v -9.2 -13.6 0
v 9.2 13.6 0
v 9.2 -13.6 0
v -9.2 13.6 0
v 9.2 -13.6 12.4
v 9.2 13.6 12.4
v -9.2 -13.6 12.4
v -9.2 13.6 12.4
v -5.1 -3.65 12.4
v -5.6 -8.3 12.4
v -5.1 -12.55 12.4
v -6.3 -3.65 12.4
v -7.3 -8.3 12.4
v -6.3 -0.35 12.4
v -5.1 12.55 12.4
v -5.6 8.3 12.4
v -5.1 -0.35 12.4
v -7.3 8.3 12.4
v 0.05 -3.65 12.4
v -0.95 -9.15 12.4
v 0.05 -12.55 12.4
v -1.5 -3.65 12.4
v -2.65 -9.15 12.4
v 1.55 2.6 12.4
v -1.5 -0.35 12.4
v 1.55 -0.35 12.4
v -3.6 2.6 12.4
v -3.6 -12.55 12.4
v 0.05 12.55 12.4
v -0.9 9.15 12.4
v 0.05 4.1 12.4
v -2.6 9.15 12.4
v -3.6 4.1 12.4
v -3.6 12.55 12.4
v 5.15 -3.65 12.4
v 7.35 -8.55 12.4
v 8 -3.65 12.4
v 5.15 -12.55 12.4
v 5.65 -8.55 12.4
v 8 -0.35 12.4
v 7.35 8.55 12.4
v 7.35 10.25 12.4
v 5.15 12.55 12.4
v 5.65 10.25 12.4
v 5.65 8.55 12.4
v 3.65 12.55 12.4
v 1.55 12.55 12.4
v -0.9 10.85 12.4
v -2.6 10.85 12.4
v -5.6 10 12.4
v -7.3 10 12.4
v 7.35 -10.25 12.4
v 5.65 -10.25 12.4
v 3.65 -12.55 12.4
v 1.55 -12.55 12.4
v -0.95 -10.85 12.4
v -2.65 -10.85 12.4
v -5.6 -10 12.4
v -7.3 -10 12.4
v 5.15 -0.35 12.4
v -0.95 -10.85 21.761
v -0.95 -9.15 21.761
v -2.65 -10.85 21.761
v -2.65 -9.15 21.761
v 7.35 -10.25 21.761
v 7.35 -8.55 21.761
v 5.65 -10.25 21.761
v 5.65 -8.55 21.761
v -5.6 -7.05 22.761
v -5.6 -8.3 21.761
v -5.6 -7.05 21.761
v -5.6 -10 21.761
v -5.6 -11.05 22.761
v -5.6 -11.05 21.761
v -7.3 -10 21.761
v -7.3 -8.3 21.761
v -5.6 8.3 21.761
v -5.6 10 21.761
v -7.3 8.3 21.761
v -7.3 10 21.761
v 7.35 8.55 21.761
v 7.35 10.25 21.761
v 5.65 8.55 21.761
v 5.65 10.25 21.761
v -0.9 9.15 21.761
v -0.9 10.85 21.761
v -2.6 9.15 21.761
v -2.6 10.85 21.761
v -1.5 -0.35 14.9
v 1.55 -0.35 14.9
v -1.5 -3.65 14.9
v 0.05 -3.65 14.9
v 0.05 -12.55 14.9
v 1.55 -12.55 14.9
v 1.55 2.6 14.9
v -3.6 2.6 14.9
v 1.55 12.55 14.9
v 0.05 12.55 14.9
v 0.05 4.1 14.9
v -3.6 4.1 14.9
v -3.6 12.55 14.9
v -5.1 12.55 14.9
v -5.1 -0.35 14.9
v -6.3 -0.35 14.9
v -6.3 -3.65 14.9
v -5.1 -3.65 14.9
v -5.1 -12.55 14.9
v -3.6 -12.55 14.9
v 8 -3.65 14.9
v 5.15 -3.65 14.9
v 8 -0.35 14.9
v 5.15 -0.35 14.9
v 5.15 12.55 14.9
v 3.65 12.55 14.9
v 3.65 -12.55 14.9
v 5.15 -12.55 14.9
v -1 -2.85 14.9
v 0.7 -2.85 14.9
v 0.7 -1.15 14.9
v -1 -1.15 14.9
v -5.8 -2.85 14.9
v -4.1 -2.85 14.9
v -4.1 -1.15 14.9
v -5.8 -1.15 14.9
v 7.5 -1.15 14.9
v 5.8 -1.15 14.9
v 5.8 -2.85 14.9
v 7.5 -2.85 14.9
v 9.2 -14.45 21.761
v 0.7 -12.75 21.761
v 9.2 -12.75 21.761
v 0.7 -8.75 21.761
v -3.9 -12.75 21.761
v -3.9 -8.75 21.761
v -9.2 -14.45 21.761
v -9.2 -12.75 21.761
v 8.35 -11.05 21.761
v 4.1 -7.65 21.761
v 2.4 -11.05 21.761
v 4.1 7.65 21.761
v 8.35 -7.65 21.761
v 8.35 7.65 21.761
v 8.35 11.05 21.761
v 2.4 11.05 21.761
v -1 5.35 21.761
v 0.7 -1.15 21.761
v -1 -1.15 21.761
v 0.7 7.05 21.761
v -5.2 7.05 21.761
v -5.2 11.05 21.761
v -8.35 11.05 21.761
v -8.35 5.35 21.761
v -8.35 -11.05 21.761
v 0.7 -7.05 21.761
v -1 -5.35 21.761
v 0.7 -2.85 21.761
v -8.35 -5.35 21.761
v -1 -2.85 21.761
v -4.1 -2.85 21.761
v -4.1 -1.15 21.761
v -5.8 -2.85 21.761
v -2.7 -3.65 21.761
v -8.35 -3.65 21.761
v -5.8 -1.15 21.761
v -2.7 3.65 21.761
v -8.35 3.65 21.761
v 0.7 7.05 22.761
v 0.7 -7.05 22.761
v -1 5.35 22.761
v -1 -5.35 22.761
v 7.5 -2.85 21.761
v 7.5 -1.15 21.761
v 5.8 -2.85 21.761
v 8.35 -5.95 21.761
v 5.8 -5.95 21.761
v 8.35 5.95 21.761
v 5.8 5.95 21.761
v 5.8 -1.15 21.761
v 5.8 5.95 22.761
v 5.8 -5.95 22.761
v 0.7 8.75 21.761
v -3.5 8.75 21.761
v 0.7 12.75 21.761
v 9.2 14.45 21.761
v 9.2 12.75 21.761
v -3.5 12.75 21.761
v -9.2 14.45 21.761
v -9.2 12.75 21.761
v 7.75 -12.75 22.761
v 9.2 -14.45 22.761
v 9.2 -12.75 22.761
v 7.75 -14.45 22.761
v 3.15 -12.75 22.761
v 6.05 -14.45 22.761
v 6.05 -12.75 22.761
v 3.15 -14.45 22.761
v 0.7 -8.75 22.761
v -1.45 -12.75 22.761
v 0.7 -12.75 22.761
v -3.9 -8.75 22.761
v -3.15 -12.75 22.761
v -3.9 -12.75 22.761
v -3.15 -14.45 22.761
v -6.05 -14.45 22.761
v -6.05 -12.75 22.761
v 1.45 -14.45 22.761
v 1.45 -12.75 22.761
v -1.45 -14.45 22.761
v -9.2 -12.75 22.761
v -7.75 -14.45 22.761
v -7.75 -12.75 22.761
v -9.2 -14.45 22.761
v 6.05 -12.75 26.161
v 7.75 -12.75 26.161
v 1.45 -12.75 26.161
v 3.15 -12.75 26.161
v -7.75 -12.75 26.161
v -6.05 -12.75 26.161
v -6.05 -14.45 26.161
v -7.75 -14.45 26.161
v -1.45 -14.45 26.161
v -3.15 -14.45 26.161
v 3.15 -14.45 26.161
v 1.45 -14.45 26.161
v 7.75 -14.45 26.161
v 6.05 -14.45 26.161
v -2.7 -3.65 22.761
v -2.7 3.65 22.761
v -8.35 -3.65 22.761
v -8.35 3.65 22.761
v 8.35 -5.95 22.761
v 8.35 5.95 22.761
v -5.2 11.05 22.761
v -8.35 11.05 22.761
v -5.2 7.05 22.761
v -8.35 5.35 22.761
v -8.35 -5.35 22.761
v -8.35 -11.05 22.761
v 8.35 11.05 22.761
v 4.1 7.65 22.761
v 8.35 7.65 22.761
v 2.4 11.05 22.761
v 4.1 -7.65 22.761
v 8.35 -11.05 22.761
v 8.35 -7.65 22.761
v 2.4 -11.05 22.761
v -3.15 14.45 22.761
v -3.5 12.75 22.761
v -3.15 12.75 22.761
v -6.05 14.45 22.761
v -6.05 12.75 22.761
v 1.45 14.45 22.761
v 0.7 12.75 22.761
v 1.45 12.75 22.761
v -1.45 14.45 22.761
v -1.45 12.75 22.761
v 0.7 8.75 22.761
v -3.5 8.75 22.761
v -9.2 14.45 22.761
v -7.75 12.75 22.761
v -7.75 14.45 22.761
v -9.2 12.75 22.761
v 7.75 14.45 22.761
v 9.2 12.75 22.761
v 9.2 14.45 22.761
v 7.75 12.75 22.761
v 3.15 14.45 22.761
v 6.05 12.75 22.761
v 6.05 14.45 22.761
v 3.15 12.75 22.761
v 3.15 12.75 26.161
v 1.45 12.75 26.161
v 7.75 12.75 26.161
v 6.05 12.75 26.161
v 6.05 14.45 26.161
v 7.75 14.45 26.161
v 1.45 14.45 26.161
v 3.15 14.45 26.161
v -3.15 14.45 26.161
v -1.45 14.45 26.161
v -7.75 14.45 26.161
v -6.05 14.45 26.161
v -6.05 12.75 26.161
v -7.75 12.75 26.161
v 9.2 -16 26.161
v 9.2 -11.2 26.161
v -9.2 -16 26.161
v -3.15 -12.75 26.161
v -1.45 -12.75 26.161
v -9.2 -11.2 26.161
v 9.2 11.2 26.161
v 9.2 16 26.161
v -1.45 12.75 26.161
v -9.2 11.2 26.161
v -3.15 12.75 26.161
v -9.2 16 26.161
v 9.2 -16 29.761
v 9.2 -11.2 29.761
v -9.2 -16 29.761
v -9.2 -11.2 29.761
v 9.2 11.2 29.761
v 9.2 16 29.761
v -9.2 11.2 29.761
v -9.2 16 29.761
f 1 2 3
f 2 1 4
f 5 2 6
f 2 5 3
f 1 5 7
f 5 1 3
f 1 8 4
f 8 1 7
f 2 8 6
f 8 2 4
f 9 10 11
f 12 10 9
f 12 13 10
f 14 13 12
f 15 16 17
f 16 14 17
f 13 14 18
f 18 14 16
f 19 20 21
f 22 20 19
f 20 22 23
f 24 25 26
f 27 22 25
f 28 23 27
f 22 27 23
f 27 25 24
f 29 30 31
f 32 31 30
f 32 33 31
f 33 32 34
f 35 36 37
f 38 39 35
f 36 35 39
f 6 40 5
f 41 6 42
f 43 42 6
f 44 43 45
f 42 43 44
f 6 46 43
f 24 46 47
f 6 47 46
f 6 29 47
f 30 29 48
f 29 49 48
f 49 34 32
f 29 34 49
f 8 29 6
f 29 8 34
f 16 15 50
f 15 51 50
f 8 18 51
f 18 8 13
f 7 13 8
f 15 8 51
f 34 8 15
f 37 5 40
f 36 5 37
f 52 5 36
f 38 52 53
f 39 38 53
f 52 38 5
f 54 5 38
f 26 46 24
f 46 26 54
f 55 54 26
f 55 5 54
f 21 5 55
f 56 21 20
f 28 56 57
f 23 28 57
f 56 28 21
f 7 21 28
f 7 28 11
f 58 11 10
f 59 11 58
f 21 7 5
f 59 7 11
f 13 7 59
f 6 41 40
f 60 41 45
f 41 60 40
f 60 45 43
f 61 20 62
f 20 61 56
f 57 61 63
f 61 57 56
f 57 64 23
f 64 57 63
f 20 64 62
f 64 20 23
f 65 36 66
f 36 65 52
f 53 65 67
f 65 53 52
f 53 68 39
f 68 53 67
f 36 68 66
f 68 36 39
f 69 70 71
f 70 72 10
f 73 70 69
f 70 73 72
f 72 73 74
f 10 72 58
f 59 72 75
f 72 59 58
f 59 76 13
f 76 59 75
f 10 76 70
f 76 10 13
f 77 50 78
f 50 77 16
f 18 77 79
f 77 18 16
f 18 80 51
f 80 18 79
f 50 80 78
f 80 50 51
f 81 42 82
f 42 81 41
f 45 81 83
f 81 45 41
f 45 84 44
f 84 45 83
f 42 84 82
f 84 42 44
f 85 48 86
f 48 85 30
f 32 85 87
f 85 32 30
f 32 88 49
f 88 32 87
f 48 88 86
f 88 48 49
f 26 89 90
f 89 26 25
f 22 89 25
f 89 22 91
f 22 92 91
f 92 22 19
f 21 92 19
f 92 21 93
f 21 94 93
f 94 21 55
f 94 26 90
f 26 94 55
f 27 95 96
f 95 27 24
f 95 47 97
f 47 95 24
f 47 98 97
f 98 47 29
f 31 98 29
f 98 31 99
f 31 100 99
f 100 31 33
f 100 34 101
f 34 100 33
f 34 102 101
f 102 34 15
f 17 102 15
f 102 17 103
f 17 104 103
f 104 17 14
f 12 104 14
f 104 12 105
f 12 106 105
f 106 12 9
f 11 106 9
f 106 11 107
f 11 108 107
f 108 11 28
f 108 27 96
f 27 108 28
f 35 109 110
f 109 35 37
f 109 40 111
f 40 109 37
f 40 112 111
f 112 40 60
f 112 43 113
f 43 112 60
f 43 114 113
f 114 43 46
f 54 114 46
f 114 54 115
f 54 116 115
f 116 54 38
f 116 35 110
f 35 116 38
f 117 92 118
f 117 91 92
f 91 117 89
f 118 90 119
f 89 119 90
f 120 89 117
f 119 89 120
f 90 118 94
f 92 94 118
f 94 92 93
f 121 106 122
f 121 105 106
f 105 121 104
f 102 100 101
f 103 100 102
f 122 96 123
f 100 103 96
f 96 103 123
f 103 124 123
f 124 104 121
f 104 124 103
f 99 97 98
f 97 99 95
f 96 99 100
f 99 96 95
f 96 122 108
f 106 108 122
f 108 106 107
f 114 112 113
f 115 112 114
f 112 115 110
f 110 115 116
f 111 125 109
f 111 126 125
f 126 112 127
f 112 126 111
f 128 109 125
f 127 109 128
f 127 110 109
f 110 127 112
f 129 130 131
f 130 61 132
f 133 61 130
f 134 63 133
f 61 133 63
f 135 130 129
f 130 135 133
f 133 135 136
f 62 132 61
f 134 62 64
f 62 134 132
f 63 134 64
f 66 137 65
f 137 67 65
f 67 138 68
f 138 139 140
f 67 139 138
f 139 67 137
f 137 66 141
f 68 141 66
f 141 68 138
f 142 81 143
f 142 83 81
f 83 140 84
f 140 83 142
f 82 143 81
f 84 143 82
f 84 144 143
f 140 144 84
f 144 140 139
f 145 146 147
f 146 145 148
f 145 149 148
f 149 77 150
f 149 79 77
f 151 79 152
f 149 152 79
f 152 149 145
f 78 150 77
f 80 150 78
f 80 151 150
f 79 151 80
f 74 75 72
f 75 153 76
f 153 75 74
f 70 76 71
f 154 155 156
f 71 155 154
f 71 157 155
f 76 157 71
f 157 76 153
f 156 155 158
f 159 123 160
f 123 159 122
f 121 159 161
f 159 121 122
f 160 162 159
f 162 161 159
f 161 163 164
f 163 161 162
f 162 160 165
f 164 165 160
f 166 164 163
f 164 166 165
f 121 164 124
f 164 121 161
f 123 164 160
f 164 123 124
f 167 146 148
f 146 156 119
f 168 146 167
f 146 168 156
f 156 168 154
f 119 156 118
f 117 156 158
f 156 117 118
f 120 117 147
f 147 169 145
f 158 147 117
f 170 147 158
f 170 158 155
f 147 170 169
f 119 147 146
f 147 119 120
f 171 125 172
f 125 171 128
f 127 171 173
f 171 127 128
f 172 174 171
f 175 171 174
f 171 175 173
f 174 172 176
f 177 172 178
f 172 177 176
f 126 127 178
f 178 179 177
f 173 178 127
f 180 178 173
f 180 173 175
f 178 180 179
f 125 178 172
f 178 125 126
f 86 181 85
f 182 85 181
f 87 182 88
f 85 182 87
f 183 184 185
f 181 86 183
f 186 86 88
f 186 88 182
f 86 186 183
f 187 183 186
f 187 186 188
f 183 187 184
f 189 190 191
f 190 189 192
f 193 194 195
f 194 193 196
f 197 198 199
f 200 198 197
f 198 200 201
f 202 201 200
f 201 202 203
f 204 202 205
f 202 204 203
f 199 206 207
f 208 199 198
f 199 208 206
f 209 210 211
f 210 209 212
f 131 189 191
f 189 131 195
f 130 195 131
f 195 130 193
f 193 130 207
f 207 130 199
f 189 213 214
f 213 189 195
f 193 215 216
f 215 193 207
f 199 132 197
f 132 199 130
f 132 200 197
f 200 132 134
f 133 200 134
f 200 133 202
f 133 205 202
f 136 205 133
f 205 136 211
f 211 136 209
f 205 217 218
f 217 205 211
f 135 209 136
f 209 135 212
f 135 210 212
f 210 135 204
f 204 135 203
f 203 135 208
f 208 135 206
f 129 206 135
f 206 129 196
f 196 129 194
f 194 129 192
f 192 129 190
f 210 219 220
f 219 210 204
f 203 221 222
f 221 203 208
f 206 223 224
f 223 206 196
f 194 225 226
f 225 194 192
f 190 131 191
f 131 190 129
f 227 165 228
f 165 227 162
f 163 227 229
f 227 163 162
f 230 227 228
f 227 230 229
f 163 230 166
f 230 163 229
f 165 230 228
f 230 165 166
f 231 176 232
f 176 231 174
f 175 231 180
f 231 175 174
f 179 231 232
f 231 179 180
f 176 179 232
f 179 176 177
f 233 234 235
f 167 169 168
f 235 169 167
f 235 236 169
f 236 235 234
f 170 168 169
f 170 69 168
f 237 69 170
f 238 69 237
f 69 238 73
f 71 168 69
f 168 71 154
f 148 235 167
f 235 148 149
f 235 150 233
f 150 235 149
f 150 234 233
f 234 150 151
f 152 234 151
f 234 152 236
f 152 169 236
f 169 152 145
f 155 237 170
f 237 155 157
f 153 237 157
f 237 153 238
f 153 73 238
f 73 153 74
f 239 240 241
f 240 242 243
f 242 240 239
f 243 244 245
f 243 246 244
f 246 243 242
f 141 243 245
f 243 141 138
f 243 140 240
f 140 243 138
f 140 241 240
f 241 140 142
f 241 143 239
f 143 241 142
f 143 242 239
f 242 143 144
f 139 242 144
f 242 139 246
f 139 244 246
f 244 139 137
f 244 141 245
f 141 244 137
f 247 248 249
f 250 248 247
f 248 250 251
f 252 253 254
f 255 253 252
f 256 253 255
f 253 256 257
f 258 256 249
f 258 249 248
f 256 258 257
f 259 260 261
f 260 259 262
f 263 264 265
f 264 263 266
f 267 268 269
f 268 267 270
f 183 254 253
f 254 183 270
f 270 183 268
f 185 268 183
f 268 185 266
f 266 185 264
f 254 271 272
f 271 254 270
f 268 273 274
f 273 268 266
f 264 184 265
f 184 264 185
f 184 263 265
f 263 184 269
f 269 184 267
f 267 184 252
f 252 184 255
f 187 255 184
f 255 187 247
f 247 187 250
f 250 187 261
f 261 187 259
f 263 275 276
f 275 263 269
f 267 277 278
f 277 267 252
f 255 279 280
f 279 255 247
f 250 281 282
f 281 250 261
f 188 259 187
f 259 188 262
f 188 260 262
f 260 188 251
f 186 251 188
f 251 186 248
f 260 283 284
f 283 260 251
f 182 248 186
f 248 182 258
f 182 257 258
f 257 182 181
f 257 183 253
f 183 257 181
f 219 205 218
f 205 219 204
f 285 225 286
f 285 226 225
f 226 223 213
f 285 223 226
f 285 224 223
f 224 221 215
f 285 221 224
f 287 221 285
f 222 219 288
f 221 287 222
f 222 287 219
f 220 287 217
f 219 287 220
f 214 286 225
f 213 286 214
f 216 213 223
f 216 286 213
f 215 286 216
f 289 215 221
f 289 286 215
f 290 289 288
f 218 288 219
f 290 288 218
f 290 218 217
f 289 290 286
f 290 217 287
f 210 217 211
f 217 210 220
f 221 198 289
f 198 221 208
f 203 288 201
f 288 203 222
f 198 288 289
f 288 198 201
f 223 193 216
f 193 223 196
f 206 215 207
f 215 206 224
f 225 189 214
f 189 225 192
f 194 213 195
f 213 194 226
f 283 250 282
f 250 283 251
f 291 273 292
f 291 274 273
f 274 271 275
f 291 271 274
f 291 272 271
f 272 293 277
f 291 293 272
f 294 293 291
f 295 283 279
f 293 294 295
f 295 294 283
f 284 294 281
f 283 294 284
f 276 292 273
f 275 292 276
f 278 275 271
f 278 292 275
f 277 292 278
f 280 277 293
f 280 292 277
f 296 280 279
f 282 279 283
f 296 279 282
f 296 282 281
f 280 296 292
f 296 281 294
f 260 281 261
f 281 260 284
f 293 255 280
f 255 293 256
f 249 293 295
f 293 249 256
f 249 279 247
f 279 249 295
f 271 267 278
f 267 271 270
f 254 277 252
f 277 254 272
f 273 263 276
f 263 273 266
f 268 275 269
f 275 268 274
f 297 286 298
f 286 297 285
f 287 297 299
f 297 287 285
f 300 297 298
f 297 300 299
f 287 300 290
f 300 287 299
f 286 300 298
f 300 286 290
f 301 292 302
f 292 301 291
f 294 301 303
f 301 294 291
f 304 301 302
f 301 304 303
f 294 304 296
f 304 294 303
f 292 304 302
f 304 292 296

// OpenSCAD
// Generated by SolidPython 0.4.2 on 2020-09-29 23:20:48
//!OpenSCAD

scale(v = 0.0100000000) {
	translate(v = [-920, -1360, 0]) {
		union() {
			color(c = [0.4000000000, 0.4000000000, 0.4000000000]) {
				translate(v = [0, 0, 0]) {
					linear_extrude(height = 1000.0000000000) {
						polygon(paths = [[0, 1, 2, 3]], points = [[0, 0], [0, 2720], [1840, 2720], [1840, 0]]);
					}
				}
			}
			color(c = [0.2000000000, 0.6000000000, 0.2000000000]) {
				translate(v = [0, 0, 1000.0000000000]) {
					linear_extrude(height = 120.0000000000) {
						polygon(paths = [[0, 1, 2, 3]], points = [[0, 1305], [0, 2720], [1840, 2720], [1840, 1305]]);
					}
				}
			}
			color(c = [0.4000000000, 0.4000000000, 0.4000000000]) {
				translate(v = [0, 0, 1000.0000000000]) {
					linear_extrude(height = 120.0000000000) {
						polygon(paths = [[0, 1, 2, 3]], points = [[0, 0], [0, 1305], [1840, 1305], [1840, 0]]);
					}
				}
			}
			color(c = [0.9000000000, 0.6000000000, 0.6000000000]) {
				translate(v = [0, 0, 1120.0000000000]) {
					linear_extrude(height = 120.0000000000) {
						polygon(paths = [[0, 1, 2, 3]], points = [[150, 2065], [150, 2485], [410, 2485], [410, 2065]]);
					}
				}
			}
			color(c = [0.9000000000, 0.6000000000, 0.6000000000]) {
				translate(v = [0, 0, 1120.0000000000]) {
					linear_extrude(height = 120.0000000000) {
						polygon(paths = [[0, 1, 2, 3, 4, 5]], points = [[635, 1845], [635, 2065], [560, 2065], [560, 2485], [925, 2485], [925, 1845]]);
					}
				}
			}
			color(c = [0.9000000000, 0.6000000000, 0.6000000000]) {
				translate(v = [0, 0, 1120.0000000000]) {
					linear_extrude(height = 120.0000000000) {
						polygon(paths = [[0, 1, 2, 3]], points = [[1075, 1845], [1075, 2485], [1285, 2485], [1285, 1845]]);
					}
				}
			}
			color(c = [0.9000000000, 0.6000000000, 0.6000000000]) {
				translate(v = [0, 0, 1120.0000000000]) {
					linear_extrude(height = 120.0000000000) {
						polygon(paths = [[0, 1, 2, 3]], points = [[1435, 1845], [1435, 2485], [1695, 2485], [1695, 1845]]);
					}
				}
			}
			color(c = [0.9000000000, 0.6000000000, 0.9000000000]) {
				translate(v = [0, 0, 1120.0000000000]) {
					linear_extrude(height = 120.0000000000) {
						polygon(paths = [[0, 1, 2, 3]], points = [[150, 235], [150, 655], [410, 655], [410, 235]]);
					}
				}
			}
			color(c = [0.9000000000, 0.6000000000, 0.9000000000]) {
				translate(v = [0, 0, 1120.0000000000]) {
					linear_extrude(height = 120.0000000000) {
						polygon(paths = [[0, 1, 2, 3]], points = [[560, 235], [560, 655], [925, 655], [925, 235]]);
					}
				}
			}
			color(c = [0.9000000000, 0.6000000000, 0.9000000000]) {
				translate(v = [0, 0, 1120.0000000000]) {
					linear_extrude(height = 120.0000000000) {
						polygon(paths = [[0, 1, 2, 3]], points = [[1075, 235], [1075, 655], [1285, 655], [1285, 235]]);
					}
				}
			}
			color(c = [0.9000000000, 0.6000000000, 0.9000000000]) {
				translate(v = [0, 0, 1120.0000000000]) {
					linear_extrude(height = 120.0000000000) {
						polygon(paths = [[0, 1, 2, 3]], points = [[1435, 235], [1435, 655], [1695, 655], [1695, 235]]);
					}
				}
			}
			color(c = [0.2000000000, 0.6000000000, 0.2000000000]) {
				translate(v = [0, 0, 1120.0000000000]) {
					linear_extrude(height = 120.0000000000) {
						difference() {
							polygon(paths = [[0, 1, 2, 3]], points = [[0, 1305], [0, 2720], [1840, 2720], [1840, 1305]]);
							polygon(paths = [[0, 1, 2, 3]], points = [[1075, 1845], [1285, 1845], [1285, 2485], [1075, 2485]]);
							polygon(paths = [[0, 1, 2, 3]], points = [[1435, 1845], [1695, 1845], [1695, 2485], [1435, 2485]]);
							polygon(paths = [[0, 1, 2, 3]], points = [[150, 2065], [410, 2065], [410, 2485], [150, 2485]]);
							polygon(paths = [[0, 1, 2, 3, 4, 5]], points = [[635, 1845], [925, 1845], [925, 2485], [560, 2485], [560, 2065], [635, 2065]]);
						}
					}
				}
			}
			color(c = [0.4000000000, 0.4000000000, 0.4000000000]) {
				translate(v = [0, 0, 1120.0000000000]) {
					linear_extrude(height = 120.0000000000) {
						difference() {
							polygon(paths = [[0, 1, 2, 3]], points = [[0, 0], [0, 1305], [1840, 1305], [1840, 0]]);
							polygon(paths = [[0, 1, 2, 3]], points = [[150, 235], [410, 235], [410, 655], [150, 655]]);
							polygon(paths = [[0, 1, 2, 3]], points = [[560, 235], [925, 235], [925, 655], [560, 655]]);
							polygon(paths = [[0, 1, 2, 3]], points = [[1075, 235], [1285, 235], [1285, 655], [1075, 655]]);
							polygon(paths = [[0, 1, 2, 3]], points = [[1435, 235], [1695, 235], [1695, 655], [1435, 655]]);
						}
					}
				}
			}
			color(c = [0.1000000000, 0.1000000000, 0.1000000000]) {
				translate(v = [0, 0, 1240.0000000000]) {
					linear_extrude(height = 70.0000000000) {
						polygon(paths = [[0, 1, 2, 3]], points = [[655, 275], [655, 445], [825, 445], [825, 275]]);
					}
				}
			}
			color(c = [0.1000000000, 0.1000000000, 0.1000000000]) {
				translate(v = [0, 0, 1240.0000000000]) {
					linear_extrude(height = 70.0000000000) {
						polygon(paths = [[0, 1, 2, 3]], points = [[1485, 335], [1485, 505], [1655, 505], [1655, 335]]);
					}
				}
			}
			color(c = [0.1000000000, 0.1000000000, 0.1000000000]) {
				translate(v = [0, 0, 1240.0000000000]) {
					linear_extrude(height = 70.0000000000) {
						polygon(paths = [[0, 1, 2, 3]], points = [[190, 360], [190, 530], [360, 530], [360, 360]]);
					}
				}
			}
			color(c = [0.1000000000, 0.1000000000, 0.1000000000]) {
				translate(v = [0, 0, 1240.0000000000]) {
					linear_extrude(height = 70.0000000000) {
						polygon(paths = [[0, 1, 2, 3]], points = [[190, 2190], [190, 2360], [360, 2360], [360, 2190]]);
					}
				}
			}
			color(c = [0.1000000000, 0.1000000000, 0.1000000000]) {
				translate(v = [0, 0, 1240.0000000000]) {
					linear_extrude(height = 70.0000000000) {
						polygon(paths = [[0, 1, 2, 3]], points = [[1485, 2215], [1485, 2385], [1655, 2385], [1655, 2215]]);
					}
				}
			}
			color(c = [0.1000000000, 0.1000000000, 0.1000000000]) {
				translate(v = [0, 0, 1240.0000000000]) {
					linear_extrude(height = 70.0000000000) {
						polygon(paths = [[0, 1, 2, 3]], points = [[660, 2275], [660, 2445], [830, 2445], [830, 2275]]);
					}
				}
			}
			color(c = [1.0000000000, 1.0000000000, 1.0000000000]) {
				translate(v = [0, 0, 1240.0000000000]) {
					linear_extrude(height = 70.0000000000) {
						polygon(paths = [[0, 1, 2, 3, 4, 5]], points = [[925, 105], [925, 995], [770, 995], [770, 1325], [1075, 1325], [1075, 105]]);
					}
				}
			}
			color(c = [1.0000000000, 1.0000000000, 1.0000000000]) {
				translate(v = [0, 0, 1240.0000000000]) {
					linear_extrude(height = 70.0000000000) {
						polygon(paths = [[0, 1, 2, 3, 4, 5, 6, 7, 8, 9, 10, 11, 12, 13]], points = [[410, 105], [410, 995], [290, 995], [290, 1325], [410, 1325], [410, 2615], [560, 2615], [560, 1770], [925, 1770], [925, 2615], [1075, 2615], [1075, 1620], [560, 1620], [560, 105]]);
					}
				}
			}
			color(c = [1.0000000000, 1.0000000000, 1.0000000000]) {
				translate(v = [0, 0, 1240.0000000000]) {
					linear_extrude(height = 70.0000000000) {
						polygon(paths = [[0, 1, 2, 3, 4, 5, 6, 7]], points = [[1285, 105], [1285, 2615], [1435, 2615], [1435, 1325], [1720, 1325], [1720, 995], [1435, 995], [1435, 105]]);
					}
				}
			}
			color(c = [0.1000000000, 0.1000000000, 0.1000000000]) {
				translate(v = [0, 0, 1310.0000000000]) {
					linear_extrude(height = 180.0000000000) {
						polygon(paths = [[0, 1, 2, 3]], points = [[655, 275], [655, 445], [825, 445], [825, 275]]);
					}
				}
			}
			color(c = [0.1000000000, 0.1000000000, 0.1000000000]) {
				translate(v = [0, 0, 1310.0000000000]) {
					linear_extrude(height = 180.0000000000) {
						polygon(paths = [[0, 1, 2, 3]], points = [[1485, 335], [1485, 505], [1655, 505], [1655, 335]]);
					}
				}
			}
			color(c = [0.1000000000, 0.1000000000, 0.1000000000]) {
				translate(v = [0, 0, 1310.0000000000]) {
					linear_extrude(height = 180.0000000000) {
						polygon(paths = [[0, 1, 2, 3]], points = [[190, 360], [190, 530], [360, 530], [360, 360]]);
					}
				}
			}
			color(c = [0.1000000000, 0.1000000000, 0.1000000000]) {
				translate(v = [0, 0, 1310.0000000000]) {
					linear_extrude(height = 180.0000000000) {
						polygon(paths = [[0, 1, 2, 3]], points = [[190, 2190], [190, 2360], [360, 2360], [360, 2190]]);
					}
				}
			}
			color(c = [0.1000000000, 0.1000000000, 0.1000000000]) {
				translate(v = [0, 0, 1310.0000000000]) {
					linear_extrude(height = 180.0000000000) {
						polygon(paths = [[0, 1, 2, 3]], points = [[1485, 2215], [1485, 2385], [1655, 2385], [1655, 2215]]);
					}
				}
			}
			color(c = [0.1000000000, 0.1000000000, 0.1000000000]) {
				translate(v = [0, 0, 1310.0000000000]) {
					linear_extrude(height = 180.0000000000) {
						polygon(paths = [[0, 1, 2, 3]], points = [[660, 2275], [660, 2445], [830, 2445], [830, 2275]]);
					}
				}
			}
			color(c = [0.7000000000, 0, 0]) {
				translate(v = [0, 0, 1310.0000000000]) {
					linear_extrude(height = 180.0000000000) {
						polygon(paths = [[0, 1, 2, 3, 4, 5]], points = [[925, 105], [925, 995], [770, 995], [770, 1325], [1075, 1325], [1075, 105]]);
					}
				}
			}
			color(c = [0.7000000000, 0, 0]) {
				translate(v = [0, 0, 1310.0000000000]) {
					linear_extrude(height = 180.0000000000) {
						polygon(paths = [[0, 1, 2, 3, 4, 5, 6, 7, 8, 9, 10, 11, 12, 13]], points = [[410, 105], [410, 995], [290, 995], [290, 1325], [410, 1325], [410, 2615], [560, 2615], [560, 1770], [925, 1770], [925, 2615], [1075, 2615], [1075, 1620], [560, 1620], [560, 105]]);
					}
				}
			}
			color(c = [0.7000000000, 0, 0]) {
				translate(v = [0, 0, 1310.0000000000]) {
					linear_extrude(height = 180.0000000000) {
						polygon(paths = [[0, 1, 2, 3, 4, 5, 6, 7]], points = [[1285, 105], [1285, 2615], [1435, 2615], [1435, 1325], [1720, 1325], [1720, 995], [1435, 995], [1435, 105]]);
					}
				}
			}
			color(c = [0.1000000000, 0.1000000000, 0.1000000000]) {
				translate(v = [0, 0, 1490.0000000000]) {
					linear_extrude(height = 686.1000000000) {
						polygon(paths = [[0, 1, 2, 3]], points = [[655, 275], [655, 445], [825, 445], [825, 275]]);
					}
				}
			}
			color(c = [0.1000000000, 0.1000000000, 0.1000000000]) {
				translate(v = [0, 0, 1490.0000000000]) {
					linear_extrude(height = 686.1000000000) {
						polygon(paths = [[0, 1, 2, 3]], points = [[1485, 335], [1485, 505], [1655, 505], [1655, 335]]);
					}
				}
			}
			color(c = [0.1000000000, 0.1000000000, 0.1000000000]) {
				translate(v = [0, 0, 1490.0000000000]) {
					linear_extrude(height = 686.1000000000) {
						polygon(paths = [[0, 1, 2, 3]], points = [[190, 360], [190, 530], [360, 530], [360, 360]]);
					}
				}
			}
			color(c = [0.1000000000, 0.1000000000, 0.1000000000]) {
				translate(v = [0, 0, 1490.0000000000]) {
					linear_extrude(height = 686.1000000000) {
						polygon(paths = [[0, 1, 2, 3]], points = [[340, 1075], [340, 1245], [510, 1245], [510, 1075]]);
					}
				}
			}
			color(c = [0.1000000000, 0.1000000000, 0.1000000000]) {
				translate(v = [0, 0, 1490.0000000000]) {
					linear_extrude(height = 686.1000000000) {
						polygon(paths = [[0, 1, 2, 3]], points = [[820, 1075], [820, 1245], [990, 1245], [990, 1075]]);
					}
				}
			}
			color(c = [0.1000000000, 0.1000000000, 0.1000000000]) {
				translate(v = [0, 0, 1490.0000000000]) {
					linear_extrude(height = 686.1000000000) {
						polygon(paths = [[0, 1, 2, 3]], points = [[1500, 1075], [1500, 1245], [1670, 1245], [1670, 1075]]);
					}
				}
			}
			color(c = [0.1000000000, 0.1000000000, 0.1000000000]) {
				translate(v = [0, 0, 1490.0000000000]) {
					linear_extrude(height = 686.1000000000) {
						polygon(paths = [[0, 1, 2, 3]], points = [[190, 2190], [190, 2360], [360, 2360], [360, 2190]]);
					}
				}
			}
			color(c = [0.1000000000, 0.1000000000, 0.1000000000]) {
				translate(v = [0, 0, 1490.0000000000]) {
					linear_extrude(height = 686.1000000000) {
						polygon(paths = [[0, 1, 2, 3]], points = [[1485, 2215], [1485, 2385], [1655, 2385], [1655, 2215]]);
					}
				}
			}
			color(c = [0.1000000000, 0.1000000000, 0.1000000000]) {
				translate(v = [0, 0, 1490.0000000000]) {
					linear_extrude(height = 686.1000000000) {
						polygon(paths = [[0, 1, 2, 3]], points = [[660, 2275], [660, 2445], [830, 2445], [830, 2275]]);
					}
				}
			}
			color(c = [0.9000000000, 0.6000000000, 0.6000000000]) {
				translate(v = [0, 0, 2176.1000000000]) {
					linear_extrude(height = 100.0000000000) {
						polygon(paths = [[0, 1, 2, 3, 4, 5, 6, 7]], points = [[0, -85], [0, 85], [530, 85], [530, 485], [990, 485], [990, 85], [1840, 85], [1840, -85]]);
					}
				}
			}
			color(c = [0.9000000000, 0.6000000000, 0.6000000000]) {
				translate(v = [0, 0, 2176.1000000000]) {
					linear_extrude(height = 100.0000000000) {
						polygon(paths = [[0, 1, 2, 3]], points = [[85, 995], [85, 1725], [650, 1725], [650, 995]]);
					}
				}
			}
			color(c = [0.9000000000, 0.6000000000, 0.6000000000]) {
				translate(v = [0, 0, 2176.1000000000]) {
					linear_extrude(height = 100.0000000000) {
						polygon(paths = [[0, 1, 2, 3]], points = [[1500, 765], [1500, 1955], [1755, 1955], [1755, 765]]);
					}
				}
			}
			color(c = [0.9000000000, 0.6000000000, 0.6000000000]) {
				translate(v = [0, 0, 2176.1000000000]) {
					linear_extrude(height = 100.0000000000) {
						polygon(paths = [[0, 1, 2, 3, 4, 5, 6, 7, 8, 9, 10, 11]], points = [[85, 255], [85, 825], [820, 825], [820, 1895], [85, 1895], [85, 2465], [400, 2465], [400, 2065], [990, 2065], [990, 655], [360, 655], [360, 255]]);
					}
				}
			}
			color(c = [0.9000000000, 0.6000000000, 0.6000000000]) {
				translate(v = [0, 0, 2176.1000000000]) {
					linear_extrude(height = 100.0000000000) {
						polygon(paths = [[0, 1, 2, 3, 4, 5, 6, 7]], points = [[1160, 255], [1160, 2465], [1755, 2465], [1755, 2125], [1330, 2125], [1330, 595], [1755, 595], [1755, 255]]);
					}
				}
			}
			color(c = [0.9000000000, 0.6000000000, 0.6000000000]) {
				translate(v = [0, 0, 2176.1000000000]) {
					linear_extrude(height = 100.0000000000) {
						polygon(paths = [[0, 1, 2, 3, 4, 5, 6, 7]], points = [[570, 2235], [570, 2635], [0, 2635], [0, 2805], [1840, 2805], [1840, 2635], [990, 2635], [990, 2235]]);
					}
				}
			}
			color(c = [0.5000000000, 0.5000000000, 0.5000000000]) {
				translate(v = [0, 0, 2276.1000000000]) {
					linear_extrude(height = 340.0000000000) {
						polygon(paths = [[0, 1, 2, 3]], points = [[145, -85], [145, 85], [315, 85], [315, -85]]);
					}
				}
			}
			color(c = [0.5000000000, 0.5000000000, 0.5000000000]) {
				translate(v = [0, 0, 2276.1000000000]) {
					linear_extrude(height = 340.0000000000) {
						polygon(paths = [[0, 1, 2, 3]], points = [[605, -85], [605, 85], [775, 85], [775, -85]]);
					}
				}
			}
			color(c = [0.5000000000, 0.5000000000, 0.5000000000]) {
				translate(v = [0, 0, 2276.1000000000]) {
					linear_extrude(height = 340.0000000000) {
						polygon(paths = [[0, 1, 2, 3]], points = [[1065, -85], [1065, 85], [1235, 85], [1235, -85]]);
					}
				}
			}
			color(c = [0.5000000000, 0.5000000000, 0.5000000000]) {
				translate(v = [0, 0, 2276.1000000000]) {
					linear_extrude(height = 340.0000000000) {
						polygon(paths = [[0, 1, 2, 3]], points = [[1525, -85], [1525, 85], [1695, 85], [1695, -85]]);
					}
				}
			}
			color(c = [0.5000000000, 0.5000000000, 0.5000000000]) {
				translate(v = [0, 0, 2276.1000000000]) {
					linear_extrude(height = 340.0000000000) {
						polygon(paths = [[0, 1, 2, 3]], points = [[145, 2635], [145, 2805], [315, 2805], [315, 2635]]);
					}
				}
			}
			color(c = [0.5000000000, 0.5000000000, 0.5000000000]) {
				translate(v = [0, 0, 2276.1000000000]) {
					linear_extrude(height = 340.0000000000) {
						polygon(paths = [[0, 1, 2, 3]], points = [[605, 2635], [605, 2805], [775, 2805], [775, 2635]]);
					}
				}
			}
			color(c = [0.5000000000, 0.5000000000, 0.5000000000]) {
				translate(v = [0, 0, 2276.1000000000]) {
					linear_extrude(height = 340.0000000000) {
						polygon(paths = [[0, 1, 2, 3]], points = [[1065, 2635], [1065, 2805], [1235, 2805], [1235, 2635]]);
					}
				}
			}
			color(c = [0.5000000000, 0.5000000000, 0.5000000000]) {
				translate(v = [0, 0, 2276.1000000000]) {
					linear_extrude(height = 340.0000000000) {
						polygon(paths = [[0, 1, 2, 3]], points = [[1525, 2635], [1525, 2805], [1695, 2805], [1695, 2635]]);
					}
				}
			}
			color(c = [0.3000000000, 0.3000000000, 1]) {
				translate(v = [0, 0, 2616.1000000000]) {
					linear_extrude(height = 360.0000000000) {
						polygon(paths = [[0, 1, 2, 3]], points = [[0, -240], [0, 240], [1840, 240], [1840, -240]]);
					}
				}
			}
			color(c = [0.3000000000, 0.3000000000, 1]) {
				translate(v = [0, 0, 2616.1000000000]) {
					linear_extrude(height = 360.0000000000) {
						polygon(paths = [[0, 1, 2, 3]], points = [[0, 2480], [0, 2960], [1840, 2960], [1840, 2480]]);
					}
				}
			}
		}
	}
}
